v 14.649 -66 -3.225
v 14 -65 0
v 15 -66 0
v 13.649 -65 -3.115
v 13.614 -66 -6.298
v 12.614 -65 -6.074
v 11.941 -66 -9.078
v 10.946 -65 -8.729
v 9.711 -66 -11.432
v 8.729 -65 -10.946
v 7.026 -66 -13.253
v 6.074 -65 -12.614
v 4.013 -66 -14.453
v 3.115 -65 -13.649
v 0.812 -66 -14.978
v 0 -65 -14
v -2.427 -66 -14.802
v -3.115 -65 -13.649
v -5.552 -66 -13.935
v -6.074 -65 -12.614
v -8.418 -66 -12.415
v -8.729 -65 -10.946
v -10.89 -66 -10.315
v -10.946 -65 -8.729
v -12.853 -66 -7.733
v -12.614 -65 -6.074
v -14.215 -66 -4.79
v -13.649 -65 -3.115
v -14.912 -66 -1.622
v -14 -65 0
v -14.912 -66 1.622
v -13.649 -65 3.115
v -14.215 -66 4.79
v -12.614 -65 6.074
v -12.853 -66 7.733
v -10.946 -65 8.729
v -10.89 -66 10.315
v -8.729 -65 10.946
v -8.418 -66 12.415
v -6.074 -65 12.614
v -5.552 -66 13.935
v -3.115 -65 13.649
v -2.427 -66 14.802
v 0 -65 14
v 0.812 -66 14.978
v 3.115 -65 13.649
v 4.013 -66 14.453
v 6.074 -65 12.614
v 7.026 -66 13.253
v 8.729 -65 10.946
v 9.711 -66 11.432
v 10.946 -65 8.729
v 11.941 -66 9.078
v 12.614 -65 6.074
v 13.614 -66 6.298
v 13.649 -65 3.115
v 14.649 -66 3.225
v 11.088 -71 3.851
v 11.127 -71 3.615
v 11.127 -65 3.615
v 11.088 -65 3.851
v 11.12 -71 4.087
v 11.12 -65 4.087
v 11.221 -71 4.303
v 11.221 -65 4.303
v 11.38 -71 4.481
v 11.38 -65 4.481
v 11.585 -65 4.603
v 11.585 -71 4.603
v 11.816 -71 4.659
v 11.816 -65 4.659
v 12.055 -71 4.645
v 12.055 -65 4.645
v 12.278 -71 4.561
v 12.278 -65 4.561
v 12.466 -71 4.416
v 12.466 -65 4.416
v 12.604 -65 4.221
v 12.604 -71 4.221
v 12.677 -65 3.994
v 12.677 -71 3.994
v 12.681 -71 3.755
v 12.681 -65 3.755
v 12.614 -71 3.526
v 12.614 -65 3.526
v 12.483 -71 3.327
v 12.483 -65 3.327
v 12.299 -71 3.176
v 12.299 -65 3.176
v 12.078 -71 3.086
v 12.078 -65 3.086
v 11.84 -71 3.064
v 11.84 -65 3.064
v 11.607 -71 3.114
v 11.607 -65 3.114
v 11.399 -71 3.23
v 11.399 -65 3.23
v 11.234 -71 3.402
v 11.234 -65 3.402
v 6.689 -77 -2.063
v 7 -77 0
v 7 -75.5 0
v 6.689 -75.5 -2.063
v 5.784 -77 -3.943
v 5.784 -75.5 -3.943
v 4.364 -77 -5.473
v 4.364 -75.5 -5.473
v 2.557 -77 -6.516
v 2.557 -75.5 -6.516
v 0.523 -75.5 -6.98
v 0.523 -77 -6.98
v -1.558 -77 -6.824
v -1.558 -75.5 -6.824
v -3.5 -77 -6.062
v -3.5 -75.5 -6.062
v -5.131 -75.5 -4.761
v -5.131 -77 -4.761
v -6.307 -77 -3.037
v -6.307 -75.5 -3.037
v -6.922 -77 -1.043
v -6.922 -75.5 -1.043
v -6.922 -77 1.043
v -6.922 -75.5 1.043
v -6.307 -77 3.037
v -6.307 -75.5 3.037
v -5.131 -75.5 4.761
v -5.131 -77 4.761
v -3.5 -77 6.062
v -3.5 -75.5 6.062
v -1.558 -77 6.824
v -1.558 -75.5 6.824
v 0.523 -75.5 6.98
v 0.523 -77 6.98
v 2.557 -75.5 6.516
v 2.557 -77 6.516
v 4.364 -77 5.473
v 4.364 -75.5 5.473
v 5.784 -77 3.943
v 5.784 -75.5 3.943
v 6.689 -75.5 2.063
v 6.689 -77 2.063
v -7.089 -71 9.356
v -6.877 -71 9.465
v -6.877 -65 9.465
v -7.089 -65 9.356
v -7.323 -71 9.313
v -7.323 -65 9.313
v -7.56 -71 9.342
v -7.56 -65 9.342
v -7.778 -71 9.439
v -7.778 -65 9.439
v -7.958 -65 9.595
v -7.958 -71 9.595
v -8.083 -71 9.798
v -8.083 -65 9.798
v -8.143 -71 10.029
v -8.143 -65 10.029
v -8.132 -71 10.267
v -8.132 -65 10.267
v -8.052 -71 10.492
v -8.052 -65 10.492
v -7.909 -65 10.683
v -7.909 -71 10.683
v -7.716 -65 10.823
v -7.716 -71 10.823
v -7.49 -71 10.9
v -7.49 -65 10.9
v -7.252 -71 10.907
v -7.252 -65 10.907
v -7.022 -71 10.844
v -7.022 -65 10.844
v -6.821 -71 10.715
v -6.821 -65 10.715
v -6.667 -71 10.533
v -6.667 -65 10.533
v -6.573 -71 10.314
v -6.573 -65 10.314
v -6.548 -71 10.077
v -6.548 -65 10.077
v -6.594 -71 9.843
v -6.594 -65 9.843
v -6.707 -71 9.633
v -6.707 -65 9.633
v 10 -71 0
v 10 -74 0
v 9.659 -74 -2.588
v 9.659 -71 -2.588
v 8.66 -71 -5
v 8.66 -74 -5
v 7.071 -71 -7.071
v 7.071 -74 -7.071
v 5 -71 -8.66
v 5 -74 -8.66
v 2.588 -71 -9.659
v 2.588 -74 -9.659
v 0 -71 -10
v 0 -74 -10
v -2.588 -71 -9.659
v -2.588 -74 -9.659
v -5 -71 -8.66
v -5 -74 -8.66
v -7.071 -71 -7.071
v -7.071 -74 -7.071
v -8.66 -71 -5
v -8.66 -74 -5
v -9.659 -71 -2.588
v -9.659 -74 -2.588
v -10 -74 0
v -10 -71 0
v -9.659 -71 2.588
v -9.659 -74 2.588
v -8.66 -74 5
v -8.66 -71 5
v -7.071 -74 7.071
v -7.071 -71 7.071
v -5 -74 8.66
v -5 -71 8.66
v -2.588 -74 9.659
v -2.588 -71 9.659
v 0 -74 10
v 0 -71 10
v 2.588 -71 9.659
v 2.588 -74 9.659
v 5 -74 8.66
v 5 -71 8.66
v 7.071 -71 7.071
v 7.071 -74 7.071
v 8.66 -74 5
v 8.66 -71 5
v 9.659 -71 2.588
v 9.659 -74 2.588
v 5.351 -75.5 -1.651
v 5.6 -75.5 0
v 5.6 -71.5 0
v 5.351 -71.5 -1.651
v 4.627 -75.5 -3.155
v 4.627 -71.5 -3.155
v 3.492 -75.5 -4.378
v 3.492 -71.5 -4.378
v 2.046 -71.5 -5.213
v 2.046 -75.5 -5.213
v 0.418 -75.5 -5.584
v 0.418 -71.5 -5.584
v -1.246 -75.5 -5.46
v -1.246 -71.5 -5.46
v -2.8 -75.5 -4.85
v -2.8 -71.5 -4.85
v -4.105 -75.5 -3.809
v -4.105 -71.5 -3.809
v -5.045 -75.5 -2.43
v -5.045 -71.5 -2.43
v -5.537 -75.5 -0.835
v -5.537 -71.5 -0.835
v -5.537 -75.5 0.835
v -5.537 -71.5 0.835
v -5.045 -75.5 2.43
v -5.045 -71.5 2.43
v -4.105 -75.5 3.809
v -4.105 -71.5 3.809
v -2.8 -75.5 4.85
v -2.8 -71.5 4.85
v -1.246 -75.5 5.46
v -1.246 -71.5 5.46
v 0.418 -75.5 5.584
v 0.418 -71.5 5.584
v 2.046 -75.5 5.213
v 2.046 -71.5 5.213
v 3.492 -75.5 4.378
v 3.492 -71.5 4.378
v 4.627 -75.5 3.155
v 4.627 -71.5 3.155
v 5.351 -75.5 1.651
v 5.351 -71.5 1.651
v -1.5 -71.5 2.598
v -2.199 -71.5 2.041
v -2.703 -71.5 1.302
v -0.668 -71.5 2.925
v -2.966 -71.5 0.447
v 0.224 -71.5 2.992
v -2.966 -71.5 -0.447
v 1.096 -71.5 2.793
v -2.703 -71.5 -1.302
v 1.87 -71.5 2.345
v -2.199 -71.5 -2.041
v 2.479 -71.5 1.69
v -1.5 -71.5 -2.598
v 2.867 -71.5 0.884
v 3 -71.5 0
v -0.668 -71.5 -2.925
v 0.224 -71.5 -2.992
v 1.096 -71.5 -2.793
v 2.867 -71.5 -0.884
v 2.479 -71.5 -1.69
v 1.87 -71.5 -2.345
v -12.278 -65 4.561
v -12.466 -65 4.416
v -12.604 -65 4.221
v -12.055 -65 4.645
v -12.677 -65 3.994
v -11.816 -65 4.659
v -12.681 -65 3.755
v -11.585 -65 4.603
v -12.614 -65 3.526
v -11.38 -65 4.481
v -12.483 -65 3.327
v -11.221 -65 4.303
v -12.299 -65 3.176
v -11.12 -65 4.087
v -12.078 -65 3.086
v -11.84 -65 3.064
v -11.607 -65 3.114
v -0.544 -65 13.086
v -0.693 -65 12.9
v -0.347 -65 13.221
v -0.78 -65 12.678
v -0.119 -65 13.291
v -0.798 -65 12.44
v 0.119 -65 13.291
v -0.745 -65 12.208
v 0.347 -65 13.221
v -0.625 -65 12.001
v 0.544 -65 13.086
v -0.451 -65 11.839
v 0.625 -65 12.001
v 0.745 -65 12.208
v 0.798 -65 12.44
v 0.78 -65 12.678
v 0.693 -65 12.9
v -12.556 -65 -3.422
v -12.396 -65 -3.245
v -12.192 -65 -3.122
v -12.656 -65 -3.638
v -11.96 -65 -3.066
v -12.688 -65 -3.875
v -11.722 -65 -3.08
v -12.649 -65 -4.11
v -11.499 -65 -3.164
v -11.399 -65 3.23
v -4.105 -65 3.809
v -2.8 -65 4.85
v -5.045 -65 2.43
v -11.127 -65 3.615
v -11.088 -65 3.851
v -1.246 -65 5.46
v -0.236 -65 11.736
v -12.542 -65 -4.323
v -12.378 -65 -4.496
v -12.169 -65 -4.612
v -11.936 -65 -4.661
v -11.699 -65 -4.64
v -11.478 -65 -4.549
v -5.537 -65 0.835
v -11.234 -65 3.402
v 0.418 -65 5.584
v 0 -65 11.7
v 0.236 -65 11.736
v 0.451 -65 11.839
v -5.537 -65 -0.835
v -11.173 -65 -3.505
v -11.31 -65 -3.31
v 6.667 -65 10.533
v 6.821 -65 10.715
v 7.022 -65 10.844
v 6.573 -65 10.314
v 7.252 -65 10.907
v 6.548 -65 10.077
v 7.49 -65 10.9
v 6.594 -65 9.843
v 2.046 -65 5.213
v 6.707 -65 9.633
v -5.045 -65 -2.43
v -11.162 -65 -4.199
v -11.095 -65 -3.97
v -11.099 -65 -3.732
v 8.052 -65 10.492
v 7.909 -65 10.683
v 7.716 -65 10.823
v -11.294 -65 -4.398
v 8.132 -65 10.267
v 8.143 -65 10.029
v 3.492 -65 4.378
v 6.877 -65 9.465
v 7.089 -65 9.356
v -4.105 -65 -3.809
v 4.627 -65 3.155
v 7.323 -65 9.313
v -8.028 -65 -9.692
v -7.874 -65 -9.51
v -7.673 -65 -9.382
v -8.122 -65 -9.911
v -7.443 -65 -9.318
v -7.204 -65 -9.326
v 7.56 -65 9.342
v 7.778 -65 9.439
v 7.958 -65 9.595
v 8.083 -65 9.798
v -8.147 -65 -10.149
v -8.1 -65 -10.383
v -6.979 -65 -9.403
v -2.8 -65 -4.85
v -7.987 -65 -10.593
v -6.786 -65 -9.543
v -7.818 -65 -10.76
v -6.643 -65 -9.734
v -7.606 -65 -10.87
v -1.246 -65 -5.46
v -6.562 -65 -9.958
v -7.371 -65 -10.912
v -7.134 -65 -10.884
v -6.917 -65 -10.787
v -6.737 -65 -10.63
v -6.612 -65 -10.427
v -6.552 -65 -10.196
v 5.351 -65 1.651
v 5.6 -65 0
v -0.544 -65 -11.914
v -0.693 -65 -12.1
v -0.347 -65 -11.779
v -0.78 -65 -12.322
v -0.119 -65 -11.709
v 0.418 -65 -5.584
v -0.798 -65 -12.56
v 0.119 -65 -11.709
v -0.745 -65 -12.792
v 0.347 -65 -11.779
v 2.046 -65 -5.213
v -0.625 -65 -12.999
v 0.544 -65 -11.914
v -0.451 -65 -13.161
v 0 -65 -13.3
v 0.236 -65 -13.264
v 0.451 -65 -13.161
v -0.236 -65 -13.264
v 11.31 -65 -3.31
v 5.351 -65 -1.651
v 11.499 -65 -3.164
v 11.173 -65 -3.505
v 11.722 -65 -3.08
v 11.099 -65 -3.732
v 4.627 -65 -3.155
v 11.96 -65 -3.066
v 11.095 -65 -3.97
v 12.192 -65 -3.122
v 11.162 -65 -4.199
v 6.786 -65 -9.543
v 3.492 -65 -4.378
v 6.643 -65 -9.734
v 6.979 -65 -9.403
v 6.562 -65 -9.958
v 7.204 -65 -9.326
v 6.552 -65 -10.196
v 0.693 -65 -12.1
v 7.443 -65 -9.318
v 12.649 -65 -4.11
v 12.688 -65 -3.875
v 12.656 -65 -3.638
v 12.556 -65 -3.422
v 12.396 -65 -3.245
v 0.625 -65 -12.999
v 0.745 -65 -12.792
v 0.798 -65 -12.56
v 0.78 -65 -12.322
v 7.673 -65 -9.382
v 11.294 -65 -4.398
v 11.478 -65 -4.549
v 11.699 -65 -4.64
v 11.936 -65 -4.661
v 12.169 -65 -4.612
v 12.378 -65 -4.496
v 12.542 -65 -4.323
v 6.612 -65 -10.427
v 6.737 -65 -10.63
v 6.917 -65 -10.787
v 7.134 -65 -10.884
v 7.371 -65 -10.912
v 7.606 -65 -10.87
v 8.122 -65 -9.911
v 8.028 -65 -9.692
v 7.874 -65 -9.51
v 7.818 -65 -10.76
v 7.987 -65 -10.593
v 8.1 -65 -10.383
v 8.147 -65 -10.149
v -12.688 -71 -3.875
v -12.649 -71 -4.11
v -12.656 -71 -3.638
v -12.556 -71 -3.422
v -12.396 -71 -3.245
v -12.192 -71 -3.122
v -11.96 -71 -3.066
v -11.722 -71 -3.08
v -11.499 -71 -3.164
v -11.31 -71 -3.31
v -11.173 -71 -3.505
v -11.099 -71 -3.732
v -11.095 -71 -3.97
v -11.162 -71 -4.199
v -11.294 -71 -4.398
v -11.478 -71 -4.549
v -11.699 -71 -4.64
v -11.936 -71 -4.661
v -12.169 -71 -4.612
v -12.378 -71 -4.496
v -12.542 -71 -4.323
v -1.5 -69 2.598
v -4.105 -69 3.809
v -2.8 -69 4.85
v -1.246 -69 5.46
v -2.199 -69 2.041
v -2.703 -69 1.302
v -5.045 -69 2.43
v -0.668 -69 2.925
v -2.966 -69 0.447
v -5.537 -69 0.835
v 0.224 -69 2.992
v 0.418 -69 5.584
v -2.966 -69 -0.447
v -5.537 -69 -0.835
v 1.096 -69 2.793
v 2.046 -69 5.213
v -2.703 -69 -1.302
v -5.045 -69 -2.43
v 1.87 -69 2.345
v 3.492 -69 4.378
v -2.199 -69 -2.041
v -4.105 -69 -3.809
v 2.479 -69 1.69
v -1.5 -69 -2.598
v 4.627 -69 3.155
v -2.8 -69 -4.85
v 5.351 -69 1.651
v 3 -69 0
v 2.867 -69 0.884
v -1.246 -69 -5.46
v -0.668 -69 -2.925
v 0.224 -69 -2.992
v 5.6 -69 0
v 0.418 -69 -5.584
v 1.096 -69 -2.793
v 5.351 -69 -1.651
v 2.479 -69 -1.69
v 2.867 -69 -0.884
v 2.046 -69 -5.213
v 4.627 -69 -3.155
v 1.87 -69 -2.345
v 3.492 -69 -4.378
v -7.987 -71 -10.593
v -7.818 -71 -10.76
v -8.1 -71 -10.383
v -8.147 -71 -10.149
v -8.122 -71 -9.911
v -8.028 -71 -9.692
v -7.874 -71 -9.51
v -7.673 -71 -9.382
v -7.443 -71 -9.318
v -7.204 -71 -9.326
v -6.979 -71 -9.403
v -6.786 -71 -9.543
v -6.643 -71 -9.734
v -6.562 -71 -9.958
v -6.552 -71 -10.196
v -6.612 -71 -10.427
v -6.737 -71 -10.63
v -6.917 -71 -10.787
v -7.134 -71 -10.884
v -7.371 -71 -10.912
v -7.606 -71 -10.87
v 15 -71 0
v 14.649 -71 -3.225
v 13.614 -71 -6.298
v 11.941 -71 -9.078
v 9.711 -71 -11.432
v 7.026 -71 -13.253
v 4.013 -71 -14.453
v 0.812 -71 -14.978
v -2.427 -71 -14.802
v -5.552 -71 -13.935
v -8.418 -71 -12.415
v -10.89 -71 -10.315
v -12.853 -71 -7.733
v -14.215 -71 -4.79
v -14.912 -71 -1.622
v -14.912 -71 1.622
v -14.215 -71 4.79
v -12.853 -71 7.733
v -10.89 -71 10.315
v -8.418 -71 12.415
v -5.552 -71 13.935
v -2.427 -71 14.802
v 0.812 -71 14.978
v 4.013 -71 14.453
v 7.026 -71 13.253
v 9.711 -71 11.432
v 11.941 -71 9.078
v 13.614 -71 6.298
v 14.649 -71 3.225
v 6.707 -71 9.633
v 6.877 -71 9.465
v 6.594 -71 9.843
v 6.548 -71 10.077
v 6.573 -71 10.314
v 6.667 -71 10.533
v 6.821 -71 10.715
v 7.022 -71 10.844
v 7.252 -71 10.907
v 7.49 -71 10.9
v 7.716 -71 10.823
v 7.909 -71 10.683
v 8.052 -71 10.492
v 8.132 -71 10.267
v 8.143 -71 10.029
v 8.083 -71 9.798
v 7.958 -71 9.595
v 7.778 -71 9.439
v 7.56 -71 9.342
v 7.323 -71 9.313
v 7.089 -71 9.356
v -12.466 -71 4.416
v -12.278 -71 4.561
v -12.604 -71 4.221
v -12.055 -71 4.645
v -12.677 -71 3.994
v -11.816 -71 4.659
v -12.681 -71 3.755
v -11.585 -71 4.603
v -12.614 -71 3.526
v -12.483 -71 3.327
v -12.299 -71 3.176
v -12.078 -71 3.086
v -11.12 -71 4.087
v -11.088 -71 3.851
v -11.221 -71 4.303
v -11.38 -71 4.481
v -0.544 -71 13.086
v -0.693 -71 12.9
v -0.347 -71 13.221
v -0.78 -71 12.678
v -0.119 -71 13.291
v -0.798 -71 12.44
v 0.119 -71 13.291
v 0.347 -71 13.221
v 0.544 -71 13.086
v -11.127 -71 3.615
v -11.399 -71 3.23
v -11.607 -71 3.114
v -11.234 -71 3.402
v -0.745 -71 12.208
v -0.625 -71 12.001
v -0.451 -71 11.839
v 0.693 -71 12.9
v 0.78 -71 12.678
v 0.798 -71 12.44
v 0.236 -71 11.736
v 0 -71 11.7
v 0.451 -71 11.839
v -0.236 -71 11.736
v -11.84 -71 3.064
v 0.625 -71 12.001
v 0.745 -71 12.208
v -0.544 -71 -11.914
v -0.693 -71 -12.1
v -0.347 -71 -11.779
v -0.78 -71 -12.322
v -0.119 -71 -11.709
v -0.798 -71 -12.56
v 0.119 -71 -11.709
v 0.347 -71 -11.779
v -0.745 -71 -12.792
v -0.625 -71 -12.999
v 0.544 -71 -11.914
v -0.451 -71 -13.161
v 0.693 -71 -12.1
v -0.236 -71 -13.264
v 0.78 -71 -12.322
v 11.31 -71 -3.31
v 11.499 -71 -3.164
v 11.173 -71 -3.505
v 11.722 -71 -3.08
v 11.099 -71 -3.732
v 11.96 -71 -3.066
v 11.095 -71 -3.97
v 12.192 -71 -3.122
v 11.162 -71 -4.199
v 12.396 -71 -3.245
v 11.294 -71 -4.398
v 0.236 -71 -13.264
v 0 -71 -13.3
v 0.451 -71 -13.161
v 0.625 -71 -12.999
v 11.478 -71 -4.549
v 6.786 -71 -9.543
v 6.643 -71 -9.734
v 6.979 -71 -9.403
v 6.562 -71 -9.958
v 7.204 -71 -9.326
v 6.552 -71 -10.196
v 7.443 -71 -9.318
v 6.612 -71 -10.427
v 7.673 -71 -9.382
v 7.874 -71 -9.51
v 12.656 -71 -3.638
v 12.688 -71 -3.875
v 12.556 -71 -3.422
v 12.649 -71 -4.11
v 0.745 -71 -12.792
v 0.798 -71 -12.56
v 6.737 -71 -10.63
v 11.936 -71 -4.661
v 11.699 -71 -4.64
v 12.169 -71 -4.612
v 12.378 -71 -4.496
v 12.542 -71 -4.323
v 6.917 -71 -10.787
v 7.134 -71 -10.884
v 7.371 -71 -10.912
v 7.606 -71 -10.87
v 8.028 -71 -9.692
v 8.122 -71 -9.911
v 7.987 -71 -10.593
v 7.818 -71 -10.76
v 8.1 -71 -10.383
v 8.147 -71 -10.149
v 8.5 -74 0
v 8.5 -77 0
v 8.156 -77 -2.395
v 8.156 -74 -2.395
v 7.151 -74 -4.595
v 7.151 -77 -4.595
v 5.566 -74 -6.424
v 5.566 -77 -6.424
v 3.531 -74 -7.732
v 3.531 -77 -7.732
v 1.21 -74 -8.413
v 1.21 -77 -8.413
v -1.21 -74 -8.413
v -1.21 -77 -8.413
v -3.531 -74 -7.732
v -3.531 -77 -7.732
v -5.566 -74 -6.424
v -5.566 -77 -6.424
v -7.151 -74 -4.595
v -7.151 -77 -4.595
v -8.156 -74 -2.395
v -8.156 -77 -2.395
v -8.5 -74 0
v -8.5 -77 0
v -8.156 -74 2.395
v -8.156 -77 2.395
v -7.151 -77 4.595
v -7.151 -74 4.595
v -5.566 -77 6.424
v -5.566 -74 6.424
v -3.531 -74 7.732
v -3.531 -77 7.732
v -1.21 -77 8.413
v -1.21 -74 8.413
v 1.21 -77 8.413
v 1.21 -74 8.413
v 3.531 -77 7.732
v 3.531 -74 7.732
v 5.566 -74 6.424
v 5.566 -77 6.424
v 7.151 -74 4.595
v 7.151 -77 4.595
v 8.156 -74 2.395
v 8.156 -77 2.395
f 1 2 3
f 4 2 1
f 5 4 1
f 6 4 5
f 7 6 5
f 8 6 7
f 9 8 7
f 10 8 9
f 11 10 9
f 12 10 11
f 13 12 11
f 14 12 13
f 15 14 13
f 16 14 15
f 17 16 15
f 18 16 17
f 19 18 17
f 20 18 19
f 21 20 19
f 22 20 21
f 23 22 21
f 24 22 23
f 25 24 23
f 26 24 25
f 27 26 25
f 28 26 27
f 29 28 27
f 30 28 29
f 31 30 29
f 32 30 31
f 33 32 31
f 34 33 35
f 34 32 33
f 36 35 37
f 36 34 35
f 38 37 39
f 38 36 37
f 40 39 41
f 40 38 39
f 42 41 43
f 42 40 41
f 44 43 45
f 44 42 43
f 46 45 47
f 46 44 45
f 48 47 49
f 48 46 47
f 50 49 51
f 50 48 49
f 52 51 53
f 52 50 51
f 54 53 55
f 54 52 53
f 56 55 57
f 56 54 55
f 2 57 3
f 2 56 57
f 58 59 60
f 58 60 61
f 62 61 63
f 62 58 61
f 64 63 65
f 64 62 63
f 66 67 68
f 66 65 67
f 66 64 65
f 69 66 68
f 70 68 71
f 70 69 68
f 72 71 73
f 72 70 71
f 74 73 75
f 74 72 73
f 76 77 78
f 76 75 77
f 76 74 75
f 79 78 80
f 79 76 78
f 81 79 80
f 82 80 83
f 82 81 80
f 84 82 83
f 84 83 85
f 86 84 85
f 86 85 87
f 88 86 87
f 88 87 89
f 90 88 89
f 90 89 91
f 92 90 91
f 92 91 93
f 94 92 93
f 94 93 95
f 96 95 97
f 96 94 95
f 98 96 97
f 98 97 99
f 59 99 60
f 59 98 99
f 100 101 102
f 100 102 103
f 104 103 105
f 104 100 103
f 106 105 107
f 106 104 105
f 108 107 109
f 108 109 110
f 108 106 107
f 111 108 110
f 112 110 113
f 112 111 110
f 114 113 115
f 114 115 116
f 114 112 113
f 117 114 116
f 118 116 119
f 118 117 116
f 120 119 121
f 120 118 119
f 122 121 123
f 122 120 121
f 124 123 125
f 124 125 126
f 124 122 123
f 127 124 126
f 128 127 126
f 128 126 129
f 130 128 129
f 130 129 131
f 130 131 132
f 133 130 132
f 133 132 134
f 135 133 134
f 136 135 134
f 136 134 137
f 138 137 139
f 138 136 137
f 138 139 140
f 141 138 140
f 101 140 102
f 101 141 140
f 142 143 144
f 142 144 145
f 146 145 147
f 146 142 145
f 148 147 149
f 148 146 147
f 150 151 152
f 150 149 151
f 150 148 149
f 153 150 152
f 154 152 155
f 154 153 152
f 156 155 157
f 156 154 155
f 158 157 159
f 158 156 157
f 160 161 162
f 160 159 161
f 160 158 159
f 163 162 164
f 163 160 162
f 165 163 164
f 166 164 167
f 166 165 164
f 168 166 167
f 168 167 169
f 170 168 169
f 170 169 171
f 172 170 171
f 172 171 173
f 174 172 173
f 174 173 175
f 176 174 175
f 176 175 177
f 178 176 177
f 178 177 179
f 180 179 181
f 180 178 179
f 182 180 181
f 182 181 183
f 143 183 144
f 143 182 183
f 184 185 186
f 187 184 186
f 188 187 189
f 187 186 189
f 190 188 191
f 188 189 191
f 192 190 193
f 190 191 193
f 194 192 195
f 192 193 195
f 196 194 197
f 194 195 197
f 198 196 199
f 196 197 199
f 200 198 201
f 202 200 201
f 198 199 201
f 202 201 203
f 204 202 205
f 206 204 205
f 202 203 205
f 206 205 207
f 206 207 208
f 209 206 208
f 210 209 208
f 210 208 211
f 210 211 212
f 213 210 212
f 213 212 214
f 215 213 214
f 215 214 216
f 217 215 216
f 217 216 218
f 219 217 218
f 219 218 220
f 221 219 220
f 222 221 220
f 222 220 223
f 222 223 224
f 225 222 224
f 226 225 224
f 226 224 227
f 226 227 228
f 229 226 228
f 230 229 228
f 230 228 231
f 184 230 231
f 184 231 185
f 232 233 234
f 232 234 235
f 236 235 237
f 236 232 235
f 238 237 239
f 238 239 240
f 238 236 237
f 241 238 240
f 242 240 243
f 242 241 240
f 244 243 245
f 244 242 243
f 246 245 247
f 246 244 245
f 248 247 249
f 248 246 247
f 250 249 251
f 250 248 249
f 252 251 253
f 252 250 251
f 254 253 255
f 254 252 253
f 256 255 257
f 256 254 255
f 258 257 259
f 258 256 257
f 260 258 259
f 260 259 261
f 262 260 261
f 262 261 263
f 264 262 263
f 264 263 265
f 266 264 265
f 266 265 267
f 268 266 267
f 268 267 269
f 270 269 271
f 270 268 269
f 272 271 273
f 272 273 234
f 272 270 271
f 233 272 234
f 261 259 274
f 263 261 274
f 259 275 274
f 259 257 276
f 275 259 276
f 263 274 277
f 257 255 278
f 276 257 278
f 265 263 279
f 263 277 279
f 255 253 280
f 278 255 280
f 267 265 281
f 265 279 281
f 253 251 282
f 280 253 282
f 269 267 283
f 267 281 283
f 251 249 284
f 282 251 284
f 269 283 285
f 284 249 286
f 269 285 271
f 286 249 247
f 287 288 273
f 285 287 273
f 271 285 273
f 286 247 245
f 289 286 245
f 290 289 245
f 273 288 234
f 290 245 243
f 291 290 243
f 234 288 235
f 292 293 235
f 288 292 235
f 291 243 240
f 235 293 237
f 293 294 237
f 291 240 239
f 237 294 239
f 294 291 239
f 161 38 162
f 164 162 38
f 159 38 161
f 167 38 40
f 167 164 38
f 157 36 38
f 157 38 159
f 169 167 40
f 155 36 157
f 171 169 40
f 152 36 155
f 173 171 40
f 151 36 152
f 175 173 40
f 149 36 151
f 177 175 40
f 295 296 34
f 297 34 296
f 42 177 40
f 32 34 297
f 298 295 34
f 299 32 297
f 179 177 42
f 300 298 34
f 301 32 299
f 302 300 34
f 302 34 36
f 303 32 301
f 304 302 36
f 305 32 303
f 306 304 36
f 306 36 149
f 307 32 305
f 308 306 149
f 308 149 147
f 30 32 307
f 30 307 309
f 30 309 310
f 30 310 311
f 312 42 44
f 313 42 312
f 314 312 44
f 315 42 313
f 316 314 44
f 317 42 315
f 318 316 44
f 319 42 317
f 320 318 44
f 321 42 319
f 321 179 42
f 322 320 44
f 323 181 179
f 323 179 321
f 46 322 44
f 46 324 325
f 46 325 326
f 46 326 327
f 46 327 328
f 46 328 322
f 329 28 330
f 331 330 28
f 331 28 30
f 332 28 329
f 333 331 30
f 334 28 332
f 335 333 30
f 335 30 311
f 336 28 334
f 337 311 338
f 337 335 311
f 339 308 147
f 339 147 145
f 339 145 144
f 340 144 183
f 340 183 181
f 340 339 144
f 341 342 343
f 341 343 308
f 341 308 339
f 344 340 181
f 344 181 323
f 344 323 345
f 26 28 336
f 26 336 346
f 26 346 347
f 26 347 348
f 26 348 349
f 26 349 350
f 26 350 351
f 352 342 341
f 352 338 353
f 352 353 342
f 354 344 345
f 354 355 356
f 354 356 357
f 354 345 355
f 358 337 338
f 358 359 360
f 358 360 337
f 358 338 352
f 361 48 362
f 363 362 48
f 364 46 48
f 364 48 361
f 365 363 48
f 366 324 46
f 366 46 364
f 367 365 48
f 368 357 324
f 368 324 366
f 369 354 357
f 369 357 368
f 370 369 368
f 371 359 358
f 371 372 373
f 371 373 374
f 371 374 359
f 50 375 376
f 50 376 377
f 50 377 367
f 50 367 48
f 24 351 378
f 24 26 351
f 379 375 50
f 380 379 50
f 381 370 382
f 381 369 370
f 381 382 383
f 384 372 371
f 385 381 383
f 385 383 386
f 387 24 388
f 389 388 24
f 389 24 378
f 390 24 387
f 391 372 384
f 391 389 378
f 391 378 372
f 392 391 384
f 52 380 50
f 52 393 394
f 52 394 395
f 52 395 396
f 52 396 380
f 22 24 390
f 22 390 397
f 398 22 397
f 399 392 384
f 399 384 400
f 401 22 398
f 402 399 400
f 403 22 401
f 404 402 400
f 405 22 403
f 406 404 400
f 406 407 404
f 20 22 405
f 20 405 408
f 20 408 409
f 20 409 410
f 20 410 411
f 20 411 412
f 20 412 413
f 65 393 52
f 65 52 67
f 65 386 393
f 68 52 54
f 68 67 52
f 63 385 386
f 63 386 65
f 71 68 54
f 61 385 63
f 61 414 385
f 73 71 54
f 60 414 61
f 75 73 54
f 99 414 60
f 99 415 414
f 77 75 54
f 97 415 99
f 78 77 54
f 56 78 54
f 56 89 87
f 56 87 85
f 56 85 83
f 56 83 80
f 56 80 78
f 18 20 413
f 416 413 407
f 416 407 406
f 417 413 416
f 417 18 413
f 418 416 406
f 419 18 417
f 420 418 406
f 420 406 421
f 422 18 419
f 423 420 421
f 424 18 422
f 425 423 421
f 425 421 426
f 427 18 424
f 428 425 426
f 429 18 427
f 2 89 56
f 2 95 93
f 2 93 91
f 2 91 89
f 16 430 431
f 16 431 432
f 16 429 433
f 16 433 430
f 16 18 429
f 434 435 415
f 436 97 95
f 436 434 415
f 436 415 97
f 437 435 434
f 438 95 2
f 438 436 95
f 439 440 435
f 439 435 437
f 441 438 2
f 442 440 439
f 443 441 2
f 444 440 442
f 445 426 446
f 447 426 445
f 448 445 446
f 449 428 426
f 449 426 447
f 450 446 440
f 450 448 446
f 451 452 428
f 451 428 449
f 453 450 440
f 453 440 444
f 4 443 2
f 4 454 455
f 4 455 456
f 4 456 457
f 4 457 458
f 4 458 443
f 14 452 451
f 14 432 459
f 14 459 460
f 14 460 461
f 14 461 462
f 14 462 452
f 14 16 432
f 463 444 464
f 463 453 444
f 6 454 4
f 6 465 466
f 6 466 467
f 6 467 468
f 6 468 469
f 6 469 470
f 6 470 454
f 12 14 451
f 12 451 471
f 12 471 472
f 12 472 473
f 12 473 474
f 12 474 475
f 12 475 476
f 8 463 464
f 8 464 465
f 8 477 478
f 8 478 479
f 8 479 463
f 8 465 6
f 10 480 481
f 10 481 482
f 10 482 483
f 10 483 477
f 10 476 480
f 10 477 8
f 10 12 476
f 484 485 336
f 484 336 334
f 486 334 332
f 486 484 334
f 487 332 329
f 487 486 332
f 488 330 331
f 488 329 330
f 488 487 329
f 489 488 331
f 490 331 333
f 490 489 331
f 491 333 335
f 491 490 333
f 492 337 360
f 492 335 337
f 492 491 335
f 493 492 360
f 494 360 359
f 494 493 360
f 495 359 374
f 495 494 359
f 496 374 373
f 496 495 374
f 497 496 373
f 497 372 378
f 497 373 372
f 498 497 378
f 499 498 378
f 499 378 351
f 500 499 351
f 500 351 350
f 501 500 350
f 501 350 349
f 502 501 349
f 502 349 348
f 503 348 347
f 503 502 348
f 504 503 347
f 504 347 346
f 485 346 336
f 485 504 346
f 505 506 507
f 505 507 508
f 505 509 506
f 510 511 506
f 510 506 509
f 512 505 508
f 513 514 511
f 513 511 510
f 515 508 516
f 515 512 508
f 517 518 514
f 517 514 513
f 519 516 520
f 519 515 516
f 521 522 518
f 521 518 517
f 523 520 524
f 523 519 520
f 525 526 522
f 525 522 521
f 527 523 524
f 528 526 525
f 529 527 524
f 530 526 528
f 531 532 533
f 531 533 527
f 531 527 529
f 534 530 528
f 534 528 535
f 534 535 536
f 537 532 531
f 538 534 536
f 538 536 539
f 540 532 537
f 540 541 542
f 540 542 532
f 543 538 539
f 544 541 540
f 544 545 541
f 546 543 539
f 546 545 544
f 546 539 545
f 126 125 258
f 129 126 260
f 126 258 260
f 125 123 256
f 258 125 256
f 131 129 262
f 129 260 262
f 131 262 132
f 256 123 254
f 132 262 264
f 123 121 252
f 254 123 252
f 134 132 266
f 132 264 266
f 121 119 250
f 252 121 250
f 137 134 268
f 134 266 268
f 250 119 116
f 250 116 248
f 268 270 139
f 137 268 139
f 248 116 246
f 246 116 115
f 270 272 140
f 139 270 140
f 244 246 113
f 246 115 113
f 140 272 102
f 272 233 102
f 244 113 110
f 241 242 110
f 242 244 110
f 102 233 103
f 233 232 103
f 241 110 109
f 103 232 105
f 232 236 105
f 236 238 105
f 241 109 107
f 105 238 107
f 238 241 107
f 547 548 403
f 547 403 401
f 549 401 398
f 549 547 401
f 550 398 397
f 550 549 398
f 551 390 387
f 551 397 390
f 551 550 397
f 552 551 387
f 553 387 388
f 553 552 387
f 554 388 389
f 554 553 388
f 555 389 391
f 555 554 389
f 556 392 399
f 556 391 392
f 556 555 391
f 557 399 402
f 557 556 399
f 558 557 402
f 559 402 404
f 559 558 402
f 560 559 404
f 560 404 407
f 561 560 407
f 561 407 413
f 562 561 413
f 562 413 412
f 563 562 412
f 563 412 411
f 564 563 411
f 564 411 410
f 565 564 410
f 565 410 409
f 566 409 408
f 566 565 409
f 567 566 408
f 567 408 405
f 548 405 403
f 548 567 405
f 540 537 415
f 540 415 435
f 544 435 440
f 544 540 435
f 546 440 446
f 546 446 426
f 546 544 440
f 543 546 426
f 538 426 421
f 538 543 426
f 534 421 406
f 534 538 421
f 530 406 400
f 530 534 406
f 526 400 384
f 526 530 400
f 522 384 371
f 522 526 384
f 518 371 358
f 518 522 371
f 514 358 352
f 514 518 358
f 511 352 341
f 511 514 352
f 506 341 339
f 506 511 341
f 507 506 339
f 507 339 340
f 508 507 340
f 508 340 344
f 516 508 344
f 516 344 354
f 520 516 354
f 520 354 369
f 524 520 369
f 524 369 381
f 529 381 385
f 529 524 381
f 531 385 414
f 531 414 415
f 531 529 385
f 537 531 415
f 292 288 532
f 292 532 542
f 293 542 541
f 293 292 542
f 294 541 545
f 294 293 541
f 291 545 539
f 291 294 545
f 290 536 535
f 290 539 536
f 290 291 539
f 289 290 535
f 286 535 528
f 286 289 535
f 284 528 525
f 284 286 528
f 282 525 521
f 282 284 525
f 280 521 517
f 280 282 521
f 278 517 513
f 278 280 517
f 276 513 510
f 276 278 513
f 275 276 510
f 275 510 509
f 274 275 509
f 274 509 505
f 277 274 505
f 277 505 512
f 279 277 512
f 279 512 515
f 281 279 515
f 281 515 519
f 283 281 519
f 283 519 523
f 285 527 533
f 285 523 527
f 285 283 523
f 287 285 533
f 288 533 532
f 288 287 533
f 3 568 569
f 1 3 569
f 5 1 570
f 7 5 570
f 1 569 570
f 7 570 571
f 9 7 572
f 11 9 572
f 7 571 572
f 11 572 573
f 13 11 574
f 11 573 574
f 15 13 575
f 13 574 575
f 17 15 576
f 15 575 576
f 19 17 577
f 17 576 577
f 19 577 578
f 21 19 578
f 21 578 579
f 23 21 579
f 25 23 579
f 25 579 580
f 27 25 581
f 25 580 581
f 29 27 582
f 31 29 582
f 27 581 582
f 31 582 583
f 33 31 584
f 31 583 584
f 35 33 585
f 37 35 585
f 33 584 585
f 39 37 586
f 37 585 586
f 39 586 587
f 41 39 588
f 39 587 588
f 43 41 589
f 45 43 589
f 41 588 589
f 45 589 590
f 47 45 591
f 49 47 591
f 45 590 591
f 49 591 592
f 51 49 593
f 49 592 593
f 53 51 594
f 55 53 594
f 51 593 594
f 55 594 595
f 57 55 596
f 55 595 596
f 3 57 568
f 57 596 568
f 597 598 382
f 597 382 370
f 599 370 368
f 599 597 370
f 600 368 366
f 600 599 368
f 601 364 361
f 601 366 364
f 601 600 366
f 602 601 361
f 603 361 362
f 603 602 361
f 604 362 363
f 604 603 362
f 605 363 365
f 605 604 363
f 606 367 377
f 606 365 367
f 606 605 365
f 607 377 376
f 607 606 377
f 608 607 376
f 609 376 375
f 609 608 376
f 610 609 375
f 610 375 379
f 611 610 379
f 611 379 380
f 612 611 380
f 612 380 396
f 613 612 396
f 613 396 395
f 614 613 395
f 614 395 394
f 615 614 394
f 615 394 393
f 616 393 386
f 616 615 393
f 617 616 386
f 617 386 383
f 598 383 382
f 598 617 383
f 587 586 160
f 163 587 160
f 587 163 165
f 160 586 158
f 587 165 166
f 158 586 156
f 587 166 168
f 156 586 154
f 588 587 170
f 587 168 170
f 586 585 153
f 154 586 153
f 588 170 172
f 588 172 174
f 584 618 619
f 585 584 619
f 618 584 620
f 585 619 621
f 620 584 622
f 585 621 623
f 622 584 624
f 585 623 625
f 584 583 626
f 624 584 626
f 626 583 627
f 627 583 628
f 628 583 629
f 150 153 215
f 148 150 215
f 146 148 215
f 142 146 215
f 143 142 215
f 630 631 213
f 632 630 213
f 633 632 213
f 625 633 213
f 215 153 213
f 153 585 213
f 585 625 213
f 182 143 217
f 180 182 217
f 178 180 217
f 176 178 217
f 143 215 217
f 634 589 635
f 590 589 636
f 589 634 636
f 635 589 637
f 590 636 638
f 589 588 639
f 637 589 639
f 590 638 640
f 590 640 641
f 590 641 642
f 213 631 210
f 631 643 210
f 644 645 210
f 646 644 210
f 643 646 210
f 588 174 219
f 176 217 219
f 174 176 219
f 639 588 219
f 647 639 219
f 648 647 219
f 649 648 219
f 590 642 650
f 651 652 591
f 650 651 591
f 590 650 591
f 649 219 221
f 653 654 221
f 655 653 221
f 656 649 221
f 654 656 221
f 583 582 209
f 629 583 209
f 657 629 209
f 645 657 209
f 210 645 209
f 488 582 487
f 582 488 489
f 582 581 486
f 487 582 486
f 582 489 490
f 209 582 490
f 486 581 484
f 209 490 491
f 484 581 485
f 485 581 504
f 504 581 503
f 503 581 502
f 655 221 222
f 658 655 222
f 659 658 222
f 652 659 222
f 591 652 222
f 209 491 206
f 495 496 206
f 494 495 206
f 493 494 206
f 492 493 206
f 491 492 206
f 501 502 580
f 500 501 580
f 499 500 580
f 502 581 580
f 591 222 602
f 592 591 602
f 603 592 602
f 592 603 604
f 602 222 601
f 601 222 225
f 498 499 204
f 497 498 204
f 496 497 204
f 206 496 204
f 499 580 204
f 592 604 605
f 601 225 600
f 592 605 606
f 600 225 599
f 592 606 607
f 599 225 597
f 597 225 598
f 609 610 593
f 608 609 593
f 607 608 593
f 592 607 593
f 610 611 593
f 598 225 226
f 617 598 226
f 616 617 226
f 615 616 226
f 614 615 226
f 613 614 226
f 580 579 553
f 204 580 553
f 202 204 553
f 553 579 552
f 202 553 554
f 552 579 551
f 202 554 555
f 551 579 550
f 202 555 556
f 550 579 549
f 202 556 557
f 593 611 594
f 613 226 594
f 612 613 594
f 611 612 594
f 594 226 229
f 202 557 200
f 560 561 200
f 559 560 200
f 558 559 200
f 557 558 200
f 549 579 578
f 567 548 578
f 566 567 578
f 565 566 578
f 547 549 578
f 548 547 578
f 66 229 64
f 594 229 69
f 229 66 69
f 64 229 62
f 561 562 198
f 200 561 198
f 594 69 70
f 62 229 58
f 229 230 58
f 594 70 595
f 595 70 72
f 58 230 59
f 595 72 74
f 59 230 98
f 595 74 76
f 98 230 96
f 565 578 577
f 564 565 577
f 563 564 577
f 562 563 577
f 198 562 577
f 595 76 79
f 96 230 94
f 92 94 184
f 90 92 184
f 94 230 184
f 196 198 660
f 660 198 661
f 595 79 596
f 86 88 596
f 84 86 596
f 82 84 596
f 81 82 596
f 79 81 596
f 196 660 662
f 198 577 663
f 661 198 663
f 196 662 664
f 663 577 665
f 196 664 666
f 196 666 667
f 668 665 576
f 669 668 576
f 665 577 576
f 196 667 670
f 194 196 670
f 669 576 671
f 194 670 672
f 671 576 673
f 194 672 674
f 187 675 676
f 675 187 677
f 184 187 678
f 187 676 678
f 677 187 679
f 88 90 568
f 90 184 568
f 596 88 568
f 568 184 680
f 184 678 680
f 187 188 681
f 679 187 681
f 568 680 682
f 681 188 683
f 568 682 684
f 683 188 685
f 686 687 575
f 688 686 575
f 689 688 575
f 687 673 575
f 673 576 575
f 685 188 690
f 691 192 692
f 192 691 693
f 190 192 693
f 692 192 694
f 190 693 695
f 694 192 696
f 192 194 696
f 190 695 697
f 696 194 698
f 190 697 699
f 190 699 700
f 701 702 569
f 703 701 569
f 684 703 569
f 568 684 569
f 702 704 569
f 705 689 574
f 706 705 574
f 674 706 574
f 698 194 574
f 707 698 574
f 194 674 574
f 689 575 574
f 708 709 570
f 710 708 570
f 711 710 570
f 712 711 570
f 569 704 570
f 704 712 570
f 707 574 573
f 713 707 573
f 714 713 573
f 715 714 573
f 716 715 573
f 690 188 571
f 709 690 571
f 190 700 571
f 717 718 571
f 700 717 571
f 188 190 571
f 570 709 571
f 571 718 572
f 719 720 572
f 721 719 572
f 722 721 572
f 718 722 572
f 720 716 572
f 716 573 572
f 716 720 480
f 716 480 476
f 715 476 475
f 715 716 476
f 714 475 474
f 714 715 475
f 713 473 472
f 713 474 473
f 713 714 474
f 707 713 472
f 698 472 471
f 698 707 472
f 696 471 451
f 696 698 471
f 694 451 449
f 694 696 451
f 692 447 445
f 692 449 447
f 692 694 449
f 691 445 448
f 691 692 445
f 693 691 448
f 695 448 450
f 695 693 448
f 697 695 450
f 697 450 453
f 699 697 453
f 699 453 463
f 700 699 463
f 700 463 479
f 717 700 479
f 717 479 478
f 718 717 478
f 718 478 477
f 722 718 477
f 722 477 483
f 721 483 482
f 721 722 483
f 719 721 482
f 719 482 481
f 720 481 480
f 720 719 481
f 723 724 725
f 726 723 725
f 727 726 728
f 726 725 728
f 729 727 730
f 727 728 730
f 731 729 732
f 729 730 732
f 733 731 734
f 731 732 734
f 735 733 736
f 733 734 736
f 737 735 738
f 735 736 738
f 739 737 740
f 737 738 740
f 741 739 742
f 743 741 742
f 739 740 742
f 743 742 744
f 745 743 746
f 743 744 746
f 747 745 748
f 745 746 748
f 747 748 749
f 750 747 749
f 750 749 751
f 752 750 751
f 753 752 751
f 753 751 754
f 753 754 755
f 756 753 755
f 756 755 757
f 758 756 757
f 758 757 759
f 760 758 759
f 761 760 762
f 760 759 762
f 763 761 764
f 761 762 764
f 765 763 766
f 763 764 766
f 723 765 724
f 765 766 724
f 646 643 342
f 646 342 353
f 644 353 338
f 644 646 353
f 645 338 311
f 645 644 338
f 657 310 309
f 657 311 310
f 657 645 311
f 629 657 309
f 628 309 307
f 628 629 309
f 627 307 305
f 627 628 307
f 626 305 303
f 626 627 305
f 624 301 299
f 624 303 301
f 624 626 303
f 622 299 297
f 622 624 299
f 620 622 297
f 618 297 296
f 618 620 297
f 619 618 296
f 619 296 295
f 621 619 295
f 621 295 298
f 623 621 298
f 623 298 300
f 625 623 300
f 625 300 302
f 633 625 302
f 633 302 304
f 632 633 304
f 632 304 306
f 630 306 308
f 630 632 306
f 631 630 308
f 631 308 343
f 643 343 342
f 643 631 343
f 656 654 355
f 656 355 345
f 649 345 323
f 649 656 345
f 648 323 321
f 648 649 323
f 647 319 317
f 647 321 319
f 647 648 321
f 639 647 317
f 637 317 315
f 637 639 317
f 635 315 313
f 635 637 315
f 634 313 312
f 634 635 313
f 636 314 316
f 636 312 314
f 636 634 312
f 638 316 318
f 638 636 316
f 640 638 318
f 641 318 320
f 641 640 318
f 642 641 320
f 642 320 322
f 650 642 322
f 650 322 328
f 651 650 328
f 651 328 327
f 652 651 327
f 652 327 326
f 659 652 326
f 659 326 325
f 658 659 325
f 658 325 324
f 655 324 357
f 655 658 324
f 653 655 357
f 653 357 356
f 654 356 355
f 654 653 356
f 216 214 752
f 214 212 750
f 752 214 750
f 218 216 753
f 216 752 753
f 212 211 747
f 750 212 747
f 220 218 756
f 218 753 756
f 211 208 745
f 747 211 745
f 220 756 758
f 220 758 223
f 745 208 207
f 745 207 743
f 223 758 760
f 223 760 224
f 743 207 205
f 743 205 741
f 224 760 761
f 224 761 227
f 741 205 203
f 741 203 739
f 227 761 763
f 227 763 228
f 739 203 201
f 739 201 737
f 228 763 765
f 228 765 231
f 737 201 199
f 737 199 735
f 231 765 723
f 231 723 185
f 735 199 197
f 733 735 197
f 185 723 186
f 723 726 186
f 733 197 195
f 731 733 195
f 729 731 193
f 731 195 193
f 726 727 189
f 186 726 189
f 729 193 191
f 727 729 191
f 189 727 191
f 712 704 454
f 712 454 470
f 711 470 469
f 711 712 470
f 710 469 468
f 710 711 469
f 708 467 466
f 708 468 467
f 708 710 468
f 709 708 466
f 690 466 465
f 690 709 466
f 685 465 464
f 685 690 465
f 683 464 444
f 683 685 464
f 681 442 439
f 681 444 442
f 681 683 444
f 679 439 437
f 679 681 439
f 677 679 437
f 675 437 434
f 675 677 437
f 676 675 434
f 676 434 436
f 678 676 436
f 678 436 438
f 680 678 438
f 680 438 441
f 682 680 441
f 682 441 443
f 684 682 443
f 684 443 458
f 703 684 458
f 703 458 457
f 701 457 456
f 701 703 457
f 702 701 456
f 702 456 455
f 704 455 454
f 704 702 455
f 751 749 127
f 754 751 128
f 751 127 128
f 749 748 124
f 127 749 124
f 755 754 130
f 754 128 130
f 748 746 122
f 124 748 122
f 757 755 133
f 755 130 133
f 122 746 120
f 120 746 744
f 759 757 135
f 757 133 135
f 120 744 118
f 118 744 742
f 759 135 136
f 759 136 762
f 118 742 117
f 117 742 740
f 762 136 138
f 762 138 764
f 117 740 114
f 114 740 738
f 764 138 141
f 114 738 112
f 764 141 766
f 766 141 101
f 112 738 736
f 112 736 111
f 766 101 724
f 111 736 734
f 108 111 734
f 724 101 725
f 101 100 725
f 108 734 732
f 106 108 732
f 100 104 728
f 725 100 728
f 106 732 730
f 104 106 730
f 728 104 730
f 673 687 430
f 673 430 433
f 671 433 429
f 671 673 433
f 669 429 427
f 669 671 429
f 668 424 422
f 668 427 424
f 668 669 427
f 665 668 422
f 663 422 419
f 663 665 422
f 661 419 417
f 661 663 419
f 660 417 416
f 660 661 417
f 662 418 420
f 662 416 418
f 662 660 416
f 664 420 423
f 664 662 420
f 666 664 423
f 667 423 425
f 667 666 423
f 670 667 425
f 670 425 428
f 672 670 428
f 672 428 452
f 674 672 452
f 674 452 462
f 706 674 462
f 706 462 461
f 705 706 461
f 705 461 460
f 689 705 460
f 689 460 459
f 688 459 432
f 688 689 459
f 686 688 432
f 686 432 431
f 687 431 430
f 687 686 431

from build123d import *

# Parameters (mm, degrees)
CYLINDER116_R              = 8.5
CYLINDER116_DEPTH          = 3
CYLINDER115_R              = 10
CYLINDER115_DEPTH          = 3
CYLINDER110_R              = 0.8
CYLINDER110_DEPTH          = 20
CYLINDER107_R              = 0.8
CYLINDER107_DEPTH          = 20
FUSION028_PLACEMENT_ANGLE  = 54
CYLINDER112_R              = 0.8
CYLINDER112_DEPTH          = 20
CYLINDER111_R              = 0.8
CYLINDER111_DEPTH          = 20
FUSION106_PLACEMENT_ANGLE  = 162
CYLINDER114_R              = 0.8
CYLINDER114_DEPTH          = 20
CYLINDER113_R              = 0.8
CYLINDER113_DEPTH          = 20
FUSION107_PLACEMENT_ANGLE  = 126
CYLINDER106_R              = 0.8
CYLINDER106_DEPTH          = 20
CYLINDER105_R              = 0.8
CYLINDER105_DEPTH          = 20
FUSION108_PLACEMENT_ANGLE  = 90
CYLINDER108_R              = 0.8
CYLINDER108_DEPTH          = 20
CYLINDER104_R              = 0.8
CYLINDER104_DEPTH          = 20
FUSION105_PLACEMENT_ANGLE  = 18
CYLINDER062_R              = 3
CYLINDER062_DEPTH          = 4
CYLINDER061_R              = 5.6
CYLINDER061_DEPTH          = 4
CYLINDER060_R              = 5.6
CYLINDER060_DEPTH          = 4
CYLINDER103_R              = 7
CYLINDER103_DEPTH          = 1.5
CYLINDER109_R              = 10
CYLINDER109_DEPTH          = 6
CYLINDER058_R              = 15
CYLINDER058_DEPTH          = 6
CHAMFER002_SIZE            = 1
CHAMFER002_PLACEMENT_ANGLE = 90


with BuildPart() as cylinder116:
    # Cylinder116 → Cylinder116 (new body)
    with BuildSketch(Plane.XY.offset(11)):
        Circle(CYLINDER116_R)
    extrude(amount=CYLINDER116_DEPTH)


with BuildPart() as cut037:
    # Cylinder115 → Cylinder115 (new body)
    with BuildSketch(Plane.XY.offset(11)):
        Circle(CYLINDER115_R)
    extrude(amount=CYLINDER115_DEPTH)

    # Cut037: cut Cylinder116
    add(cylinder116.part, mode=Mode.SUBTRACT)


with BuildPart() as cylinder110:
    # Cylinder110 → Cylinder110 (new body)
    with BuildSketch(Plane(origin=(-12.5, 0, 13), x_dir=(1, 0, 0), z_dir=(0, 0, 1))):
        Circle(CYLINDER110_R)
    extrude(amount=CYLINDER110_DEPTH)


with BuildPart() as fusion028:
    # Cylinder107 → Cylinder107 (new body)
    with BuildSketch(Plane(origin=(12.5, 0, 13), x_dir=(1, 0, 0), z_dir=(0, 0, 1))):
        Circle(CYLINDER107_R)
    extrude(amount=CYLINDER107_DEPTH)

    # Fusion028: union Cylinder110
    add(cylinder110.part)


with BuildPart() as fusion028_1:
    # Fusion028 placement: moved
    add(fusion028.part.rotate(Axis((0, 0, 0), (0, 0, 1)), FUSION028_PLACEMENT_ANGLE))


with BuildPart() as cylinder112:
    # Cylinder112 → Cylinder112 (new body)
    with BuildSketch(Plane(origin=(-12.5, 0, 13), x_dir=(1, 0, 0), z_dir=(0, 0, 1))):
        Circle(CYLINDER112_R)
    extrude(amount=CYLINDER112_DEPTH)


with BuildPart() as fusion106:
    # Cylinder111 → Cylinder111 (new body)
    with BuildSketch(Plane(origin=(12.5, 0, 13), x_dir=(1, 0, 0), z_dir=(0, 0, 1))):
        Circle(CYLINDER111_R)
    extrude(amount=CYLINDER111_DEPTH)

    # Fusion106: union Cylinder112
    add(cylinder112.part)


with BuildPart() as fusion106_1:
    # Fusion106 placement: moved
    add(fusion106.part.rotate(Axis((0, 0, 0), (0, 0, 1)), FUSION106_PLACEMENT_ANGLE))


with BuildPart() as cylinder114:
    # Cylinder114 → Cylinder114 (new body)
    with BuildSketch(Plane(origin=(-12.5, 0, 13), x_dir=(1, 0, 0), z_dir=(0, 0, 1))):
        Circle(CYLINDER114_R)
    extrude(amount=CYLINDER114_DEPTH)


with BuildPart() as fusion107:
    # Cylinder113 → Cylinder113 (new body)
    with BuildSketch(Plane(origin=(12.5, 0, 13), x_dir=(1, 0, 0), z_dir=(0, 0, 1))):
        Circle(CYLINDER113_R)
    extrude(amount=CYLINDER113_DEPTH)

    # Fusion107: union Cylinder114
    add(cylinder114.part)


with BuildPart() as fusion107_1:
    # Fusion107 placement: moved
    add(fusion107.part.rotate(Axis((0, 0, 0), (0, 0, 1)), FUSION107_PLACEMENT_ANGLE))


with BuildPart() as cylinder106:
    # Cylinder106 → Cylinder106 (new body)
    with BuildSketch(Plane(origin=(-12.5, 0, 13), x_dir=(1, 0, 0), z_dir=(0, 0, 1))):
        Circle(CYLINDER106_R)
    extrude(amount=CYLINDER106_DEPTH)


with BuildPart() as fusion108:
    # Cylinder105 → Cylinder105 (new body)
    with BuildSketch(Plane(origin=(12.5, 0, 13), x_dir=(1, 0, 0), z_dir=(0, 0, 1))):
        Circle(CYLINDER105_R)
    extrude(amount=CYLINDER105_DEPTH)

    # Fusion108: union Cylinder106
    add(cylinder106.part)


with BuildPart() as fusion108_1:
    # Fusion108 placement: moved
    add(fusion108.part.rotate(Axis((0, 0, 0), (0, 0, 1)), FUSION108_PLACEMENT_ANGLE))


with BuildPart() as cylinder108:
    # Cylinder108 → Cylinder108 (new body)
    with BuildSketch(Plane(origin=(-12.5, 0, 13), x_dir=(1, 0, 0), z_dir=(0, 0, 1))):
        Circle(CYLINDER108_R)
    extrude(amount=CYLINDER108_DEPTH)


with BuildPart() as fusion109:
    # Cylinder104 → Cylinder104 (new body)
    with BuildSketch(Plane(origin=(12.5, 0, 13), x_dir=(1, 0, 0), z_dir=(0, 0, 1))):
        Circle(CYLINDER104_R)
    extrude(amount=CYLINDER104_DEPTH)

    # Fusion105: union Cylinder108
    add(cylinder108.part)


with BuildPart() as fusion109_1:
    # Fusion105 placement: moved
    add(fusion109.part.rotate(Axis((0, 0, 0), (0, 0, 1)), FUSION105_PLACEMENT_ANGLE))

    # Fusion109: union Fusion028, Fusion106, Fusion107, Fusion108
    add(fusion028_1.part)
    add(fusion106_1.part)
    add(fusion107_1.part)
    add(fusion108_1.part)


with BuildPart() as fusion109_2:
    # Fusion109 placement: moved
    add(fusion109_1.part.moved(Location((0, 0, 3))))


with BuildPart() as cylinder062:
    # Cylinder062 → Cylinder062 (new body)
    with BuildSketch(Plane.XY.offset(3)):
        Circle(CYLINDER062_R)
    extrude(amount=CYLINDER062_DEPTH)


with BuildPart() as cylinder061:
    # Cylinder061 → Cylinder061 (new body)
    with BuildSketch(Plane.XY):
        Circle(CYLINDER061_R)
    extrude(amount=CYLINDER061_DEPTH)


with BuildPart() as fusion033:
    # Cylinder060 → Cylinder060 (new body)
    with BuildSketch(Plane.XY.offset(6.5)):
        Circle(CYLINDER060_R)
    extrude(amount=CYLINDER060_DEPTH)

    # Fusion033: union Cylinder062, Cylinder061
    add(cylinder062.part)
    add(cylinder061.part)


with BuildPart() as fusion033_1:
    # Fusion033 placement: moved
    add(fusion033.part.moved(Location((0, 0, 4.5))))


with BuildPart() as cylinder103:
    # Cylinder103 → Cylinder103 (new body)
    with BuildSketch(Plane.XY.offset(3)):
        Circle(CYLINDER103_R)
    extrude(amount=CYLINDER103_DEPTH)


with BuildPart() as cylinder109:
    # Cylinder109 → Cylinder109 (new body)
    with BuildSketch(Plane.XY.offset(3)):
        Circle(CYLINDER109_R)
    extrude(amount=CYLINDER109_DEPTH)


with BuildPart() as hub_wide_left:
    # Cylinder058 → Cylinder058 (new body)
    with BuildSketch(Plane.XY.offset(9)):
        Circle(CYLINDER058_R)
    extrude(amount=CYLINDER058_DEPTH)

    # Fusion110: union Cylinder109
    add(cylinder109.part)

    # Cut034: cut Cylinder103
    add(cylinder103.part, mode=Mode.SUBTRACT)

    # Cut035: cut Fusion033
    add(fusion033_1.part, mode=Mode.SUBTRACT)


with BuildPart() as hub_wide_left_1:
    # Cut035 placement: moved
    add(hub_wide_left.part.moved(Location((0, 0, 8))))

    # Cut036: cut Fusion109
    add(fusion109_2.part, mode=Mode.SUBTRACT)

    # Cut038: cut Cut037
    add(cut037.part, mode=Mode.SUBTRACT)

    # Chamfer002
    chamfer002_edges = [hub_wide_left_1.edges().sort_by_distance(p)[0] for p in [
        (-15, 0, 23),
    ]]
    chamfer(chamfer002_edges, length=CHAMFER002_SIZE)


with BuildPart() as hub_wide_left_2:
    # Chamfer002 placement: moved
    add(hub_wide_left_1.part.moved(Location((0, -88, 0))).rotate(Axis((0, -88, 0), (-1, 0, 0)), CHAMFER002_PLACEMENT_ANGLE))


solid = hub_wide_left_2.part
